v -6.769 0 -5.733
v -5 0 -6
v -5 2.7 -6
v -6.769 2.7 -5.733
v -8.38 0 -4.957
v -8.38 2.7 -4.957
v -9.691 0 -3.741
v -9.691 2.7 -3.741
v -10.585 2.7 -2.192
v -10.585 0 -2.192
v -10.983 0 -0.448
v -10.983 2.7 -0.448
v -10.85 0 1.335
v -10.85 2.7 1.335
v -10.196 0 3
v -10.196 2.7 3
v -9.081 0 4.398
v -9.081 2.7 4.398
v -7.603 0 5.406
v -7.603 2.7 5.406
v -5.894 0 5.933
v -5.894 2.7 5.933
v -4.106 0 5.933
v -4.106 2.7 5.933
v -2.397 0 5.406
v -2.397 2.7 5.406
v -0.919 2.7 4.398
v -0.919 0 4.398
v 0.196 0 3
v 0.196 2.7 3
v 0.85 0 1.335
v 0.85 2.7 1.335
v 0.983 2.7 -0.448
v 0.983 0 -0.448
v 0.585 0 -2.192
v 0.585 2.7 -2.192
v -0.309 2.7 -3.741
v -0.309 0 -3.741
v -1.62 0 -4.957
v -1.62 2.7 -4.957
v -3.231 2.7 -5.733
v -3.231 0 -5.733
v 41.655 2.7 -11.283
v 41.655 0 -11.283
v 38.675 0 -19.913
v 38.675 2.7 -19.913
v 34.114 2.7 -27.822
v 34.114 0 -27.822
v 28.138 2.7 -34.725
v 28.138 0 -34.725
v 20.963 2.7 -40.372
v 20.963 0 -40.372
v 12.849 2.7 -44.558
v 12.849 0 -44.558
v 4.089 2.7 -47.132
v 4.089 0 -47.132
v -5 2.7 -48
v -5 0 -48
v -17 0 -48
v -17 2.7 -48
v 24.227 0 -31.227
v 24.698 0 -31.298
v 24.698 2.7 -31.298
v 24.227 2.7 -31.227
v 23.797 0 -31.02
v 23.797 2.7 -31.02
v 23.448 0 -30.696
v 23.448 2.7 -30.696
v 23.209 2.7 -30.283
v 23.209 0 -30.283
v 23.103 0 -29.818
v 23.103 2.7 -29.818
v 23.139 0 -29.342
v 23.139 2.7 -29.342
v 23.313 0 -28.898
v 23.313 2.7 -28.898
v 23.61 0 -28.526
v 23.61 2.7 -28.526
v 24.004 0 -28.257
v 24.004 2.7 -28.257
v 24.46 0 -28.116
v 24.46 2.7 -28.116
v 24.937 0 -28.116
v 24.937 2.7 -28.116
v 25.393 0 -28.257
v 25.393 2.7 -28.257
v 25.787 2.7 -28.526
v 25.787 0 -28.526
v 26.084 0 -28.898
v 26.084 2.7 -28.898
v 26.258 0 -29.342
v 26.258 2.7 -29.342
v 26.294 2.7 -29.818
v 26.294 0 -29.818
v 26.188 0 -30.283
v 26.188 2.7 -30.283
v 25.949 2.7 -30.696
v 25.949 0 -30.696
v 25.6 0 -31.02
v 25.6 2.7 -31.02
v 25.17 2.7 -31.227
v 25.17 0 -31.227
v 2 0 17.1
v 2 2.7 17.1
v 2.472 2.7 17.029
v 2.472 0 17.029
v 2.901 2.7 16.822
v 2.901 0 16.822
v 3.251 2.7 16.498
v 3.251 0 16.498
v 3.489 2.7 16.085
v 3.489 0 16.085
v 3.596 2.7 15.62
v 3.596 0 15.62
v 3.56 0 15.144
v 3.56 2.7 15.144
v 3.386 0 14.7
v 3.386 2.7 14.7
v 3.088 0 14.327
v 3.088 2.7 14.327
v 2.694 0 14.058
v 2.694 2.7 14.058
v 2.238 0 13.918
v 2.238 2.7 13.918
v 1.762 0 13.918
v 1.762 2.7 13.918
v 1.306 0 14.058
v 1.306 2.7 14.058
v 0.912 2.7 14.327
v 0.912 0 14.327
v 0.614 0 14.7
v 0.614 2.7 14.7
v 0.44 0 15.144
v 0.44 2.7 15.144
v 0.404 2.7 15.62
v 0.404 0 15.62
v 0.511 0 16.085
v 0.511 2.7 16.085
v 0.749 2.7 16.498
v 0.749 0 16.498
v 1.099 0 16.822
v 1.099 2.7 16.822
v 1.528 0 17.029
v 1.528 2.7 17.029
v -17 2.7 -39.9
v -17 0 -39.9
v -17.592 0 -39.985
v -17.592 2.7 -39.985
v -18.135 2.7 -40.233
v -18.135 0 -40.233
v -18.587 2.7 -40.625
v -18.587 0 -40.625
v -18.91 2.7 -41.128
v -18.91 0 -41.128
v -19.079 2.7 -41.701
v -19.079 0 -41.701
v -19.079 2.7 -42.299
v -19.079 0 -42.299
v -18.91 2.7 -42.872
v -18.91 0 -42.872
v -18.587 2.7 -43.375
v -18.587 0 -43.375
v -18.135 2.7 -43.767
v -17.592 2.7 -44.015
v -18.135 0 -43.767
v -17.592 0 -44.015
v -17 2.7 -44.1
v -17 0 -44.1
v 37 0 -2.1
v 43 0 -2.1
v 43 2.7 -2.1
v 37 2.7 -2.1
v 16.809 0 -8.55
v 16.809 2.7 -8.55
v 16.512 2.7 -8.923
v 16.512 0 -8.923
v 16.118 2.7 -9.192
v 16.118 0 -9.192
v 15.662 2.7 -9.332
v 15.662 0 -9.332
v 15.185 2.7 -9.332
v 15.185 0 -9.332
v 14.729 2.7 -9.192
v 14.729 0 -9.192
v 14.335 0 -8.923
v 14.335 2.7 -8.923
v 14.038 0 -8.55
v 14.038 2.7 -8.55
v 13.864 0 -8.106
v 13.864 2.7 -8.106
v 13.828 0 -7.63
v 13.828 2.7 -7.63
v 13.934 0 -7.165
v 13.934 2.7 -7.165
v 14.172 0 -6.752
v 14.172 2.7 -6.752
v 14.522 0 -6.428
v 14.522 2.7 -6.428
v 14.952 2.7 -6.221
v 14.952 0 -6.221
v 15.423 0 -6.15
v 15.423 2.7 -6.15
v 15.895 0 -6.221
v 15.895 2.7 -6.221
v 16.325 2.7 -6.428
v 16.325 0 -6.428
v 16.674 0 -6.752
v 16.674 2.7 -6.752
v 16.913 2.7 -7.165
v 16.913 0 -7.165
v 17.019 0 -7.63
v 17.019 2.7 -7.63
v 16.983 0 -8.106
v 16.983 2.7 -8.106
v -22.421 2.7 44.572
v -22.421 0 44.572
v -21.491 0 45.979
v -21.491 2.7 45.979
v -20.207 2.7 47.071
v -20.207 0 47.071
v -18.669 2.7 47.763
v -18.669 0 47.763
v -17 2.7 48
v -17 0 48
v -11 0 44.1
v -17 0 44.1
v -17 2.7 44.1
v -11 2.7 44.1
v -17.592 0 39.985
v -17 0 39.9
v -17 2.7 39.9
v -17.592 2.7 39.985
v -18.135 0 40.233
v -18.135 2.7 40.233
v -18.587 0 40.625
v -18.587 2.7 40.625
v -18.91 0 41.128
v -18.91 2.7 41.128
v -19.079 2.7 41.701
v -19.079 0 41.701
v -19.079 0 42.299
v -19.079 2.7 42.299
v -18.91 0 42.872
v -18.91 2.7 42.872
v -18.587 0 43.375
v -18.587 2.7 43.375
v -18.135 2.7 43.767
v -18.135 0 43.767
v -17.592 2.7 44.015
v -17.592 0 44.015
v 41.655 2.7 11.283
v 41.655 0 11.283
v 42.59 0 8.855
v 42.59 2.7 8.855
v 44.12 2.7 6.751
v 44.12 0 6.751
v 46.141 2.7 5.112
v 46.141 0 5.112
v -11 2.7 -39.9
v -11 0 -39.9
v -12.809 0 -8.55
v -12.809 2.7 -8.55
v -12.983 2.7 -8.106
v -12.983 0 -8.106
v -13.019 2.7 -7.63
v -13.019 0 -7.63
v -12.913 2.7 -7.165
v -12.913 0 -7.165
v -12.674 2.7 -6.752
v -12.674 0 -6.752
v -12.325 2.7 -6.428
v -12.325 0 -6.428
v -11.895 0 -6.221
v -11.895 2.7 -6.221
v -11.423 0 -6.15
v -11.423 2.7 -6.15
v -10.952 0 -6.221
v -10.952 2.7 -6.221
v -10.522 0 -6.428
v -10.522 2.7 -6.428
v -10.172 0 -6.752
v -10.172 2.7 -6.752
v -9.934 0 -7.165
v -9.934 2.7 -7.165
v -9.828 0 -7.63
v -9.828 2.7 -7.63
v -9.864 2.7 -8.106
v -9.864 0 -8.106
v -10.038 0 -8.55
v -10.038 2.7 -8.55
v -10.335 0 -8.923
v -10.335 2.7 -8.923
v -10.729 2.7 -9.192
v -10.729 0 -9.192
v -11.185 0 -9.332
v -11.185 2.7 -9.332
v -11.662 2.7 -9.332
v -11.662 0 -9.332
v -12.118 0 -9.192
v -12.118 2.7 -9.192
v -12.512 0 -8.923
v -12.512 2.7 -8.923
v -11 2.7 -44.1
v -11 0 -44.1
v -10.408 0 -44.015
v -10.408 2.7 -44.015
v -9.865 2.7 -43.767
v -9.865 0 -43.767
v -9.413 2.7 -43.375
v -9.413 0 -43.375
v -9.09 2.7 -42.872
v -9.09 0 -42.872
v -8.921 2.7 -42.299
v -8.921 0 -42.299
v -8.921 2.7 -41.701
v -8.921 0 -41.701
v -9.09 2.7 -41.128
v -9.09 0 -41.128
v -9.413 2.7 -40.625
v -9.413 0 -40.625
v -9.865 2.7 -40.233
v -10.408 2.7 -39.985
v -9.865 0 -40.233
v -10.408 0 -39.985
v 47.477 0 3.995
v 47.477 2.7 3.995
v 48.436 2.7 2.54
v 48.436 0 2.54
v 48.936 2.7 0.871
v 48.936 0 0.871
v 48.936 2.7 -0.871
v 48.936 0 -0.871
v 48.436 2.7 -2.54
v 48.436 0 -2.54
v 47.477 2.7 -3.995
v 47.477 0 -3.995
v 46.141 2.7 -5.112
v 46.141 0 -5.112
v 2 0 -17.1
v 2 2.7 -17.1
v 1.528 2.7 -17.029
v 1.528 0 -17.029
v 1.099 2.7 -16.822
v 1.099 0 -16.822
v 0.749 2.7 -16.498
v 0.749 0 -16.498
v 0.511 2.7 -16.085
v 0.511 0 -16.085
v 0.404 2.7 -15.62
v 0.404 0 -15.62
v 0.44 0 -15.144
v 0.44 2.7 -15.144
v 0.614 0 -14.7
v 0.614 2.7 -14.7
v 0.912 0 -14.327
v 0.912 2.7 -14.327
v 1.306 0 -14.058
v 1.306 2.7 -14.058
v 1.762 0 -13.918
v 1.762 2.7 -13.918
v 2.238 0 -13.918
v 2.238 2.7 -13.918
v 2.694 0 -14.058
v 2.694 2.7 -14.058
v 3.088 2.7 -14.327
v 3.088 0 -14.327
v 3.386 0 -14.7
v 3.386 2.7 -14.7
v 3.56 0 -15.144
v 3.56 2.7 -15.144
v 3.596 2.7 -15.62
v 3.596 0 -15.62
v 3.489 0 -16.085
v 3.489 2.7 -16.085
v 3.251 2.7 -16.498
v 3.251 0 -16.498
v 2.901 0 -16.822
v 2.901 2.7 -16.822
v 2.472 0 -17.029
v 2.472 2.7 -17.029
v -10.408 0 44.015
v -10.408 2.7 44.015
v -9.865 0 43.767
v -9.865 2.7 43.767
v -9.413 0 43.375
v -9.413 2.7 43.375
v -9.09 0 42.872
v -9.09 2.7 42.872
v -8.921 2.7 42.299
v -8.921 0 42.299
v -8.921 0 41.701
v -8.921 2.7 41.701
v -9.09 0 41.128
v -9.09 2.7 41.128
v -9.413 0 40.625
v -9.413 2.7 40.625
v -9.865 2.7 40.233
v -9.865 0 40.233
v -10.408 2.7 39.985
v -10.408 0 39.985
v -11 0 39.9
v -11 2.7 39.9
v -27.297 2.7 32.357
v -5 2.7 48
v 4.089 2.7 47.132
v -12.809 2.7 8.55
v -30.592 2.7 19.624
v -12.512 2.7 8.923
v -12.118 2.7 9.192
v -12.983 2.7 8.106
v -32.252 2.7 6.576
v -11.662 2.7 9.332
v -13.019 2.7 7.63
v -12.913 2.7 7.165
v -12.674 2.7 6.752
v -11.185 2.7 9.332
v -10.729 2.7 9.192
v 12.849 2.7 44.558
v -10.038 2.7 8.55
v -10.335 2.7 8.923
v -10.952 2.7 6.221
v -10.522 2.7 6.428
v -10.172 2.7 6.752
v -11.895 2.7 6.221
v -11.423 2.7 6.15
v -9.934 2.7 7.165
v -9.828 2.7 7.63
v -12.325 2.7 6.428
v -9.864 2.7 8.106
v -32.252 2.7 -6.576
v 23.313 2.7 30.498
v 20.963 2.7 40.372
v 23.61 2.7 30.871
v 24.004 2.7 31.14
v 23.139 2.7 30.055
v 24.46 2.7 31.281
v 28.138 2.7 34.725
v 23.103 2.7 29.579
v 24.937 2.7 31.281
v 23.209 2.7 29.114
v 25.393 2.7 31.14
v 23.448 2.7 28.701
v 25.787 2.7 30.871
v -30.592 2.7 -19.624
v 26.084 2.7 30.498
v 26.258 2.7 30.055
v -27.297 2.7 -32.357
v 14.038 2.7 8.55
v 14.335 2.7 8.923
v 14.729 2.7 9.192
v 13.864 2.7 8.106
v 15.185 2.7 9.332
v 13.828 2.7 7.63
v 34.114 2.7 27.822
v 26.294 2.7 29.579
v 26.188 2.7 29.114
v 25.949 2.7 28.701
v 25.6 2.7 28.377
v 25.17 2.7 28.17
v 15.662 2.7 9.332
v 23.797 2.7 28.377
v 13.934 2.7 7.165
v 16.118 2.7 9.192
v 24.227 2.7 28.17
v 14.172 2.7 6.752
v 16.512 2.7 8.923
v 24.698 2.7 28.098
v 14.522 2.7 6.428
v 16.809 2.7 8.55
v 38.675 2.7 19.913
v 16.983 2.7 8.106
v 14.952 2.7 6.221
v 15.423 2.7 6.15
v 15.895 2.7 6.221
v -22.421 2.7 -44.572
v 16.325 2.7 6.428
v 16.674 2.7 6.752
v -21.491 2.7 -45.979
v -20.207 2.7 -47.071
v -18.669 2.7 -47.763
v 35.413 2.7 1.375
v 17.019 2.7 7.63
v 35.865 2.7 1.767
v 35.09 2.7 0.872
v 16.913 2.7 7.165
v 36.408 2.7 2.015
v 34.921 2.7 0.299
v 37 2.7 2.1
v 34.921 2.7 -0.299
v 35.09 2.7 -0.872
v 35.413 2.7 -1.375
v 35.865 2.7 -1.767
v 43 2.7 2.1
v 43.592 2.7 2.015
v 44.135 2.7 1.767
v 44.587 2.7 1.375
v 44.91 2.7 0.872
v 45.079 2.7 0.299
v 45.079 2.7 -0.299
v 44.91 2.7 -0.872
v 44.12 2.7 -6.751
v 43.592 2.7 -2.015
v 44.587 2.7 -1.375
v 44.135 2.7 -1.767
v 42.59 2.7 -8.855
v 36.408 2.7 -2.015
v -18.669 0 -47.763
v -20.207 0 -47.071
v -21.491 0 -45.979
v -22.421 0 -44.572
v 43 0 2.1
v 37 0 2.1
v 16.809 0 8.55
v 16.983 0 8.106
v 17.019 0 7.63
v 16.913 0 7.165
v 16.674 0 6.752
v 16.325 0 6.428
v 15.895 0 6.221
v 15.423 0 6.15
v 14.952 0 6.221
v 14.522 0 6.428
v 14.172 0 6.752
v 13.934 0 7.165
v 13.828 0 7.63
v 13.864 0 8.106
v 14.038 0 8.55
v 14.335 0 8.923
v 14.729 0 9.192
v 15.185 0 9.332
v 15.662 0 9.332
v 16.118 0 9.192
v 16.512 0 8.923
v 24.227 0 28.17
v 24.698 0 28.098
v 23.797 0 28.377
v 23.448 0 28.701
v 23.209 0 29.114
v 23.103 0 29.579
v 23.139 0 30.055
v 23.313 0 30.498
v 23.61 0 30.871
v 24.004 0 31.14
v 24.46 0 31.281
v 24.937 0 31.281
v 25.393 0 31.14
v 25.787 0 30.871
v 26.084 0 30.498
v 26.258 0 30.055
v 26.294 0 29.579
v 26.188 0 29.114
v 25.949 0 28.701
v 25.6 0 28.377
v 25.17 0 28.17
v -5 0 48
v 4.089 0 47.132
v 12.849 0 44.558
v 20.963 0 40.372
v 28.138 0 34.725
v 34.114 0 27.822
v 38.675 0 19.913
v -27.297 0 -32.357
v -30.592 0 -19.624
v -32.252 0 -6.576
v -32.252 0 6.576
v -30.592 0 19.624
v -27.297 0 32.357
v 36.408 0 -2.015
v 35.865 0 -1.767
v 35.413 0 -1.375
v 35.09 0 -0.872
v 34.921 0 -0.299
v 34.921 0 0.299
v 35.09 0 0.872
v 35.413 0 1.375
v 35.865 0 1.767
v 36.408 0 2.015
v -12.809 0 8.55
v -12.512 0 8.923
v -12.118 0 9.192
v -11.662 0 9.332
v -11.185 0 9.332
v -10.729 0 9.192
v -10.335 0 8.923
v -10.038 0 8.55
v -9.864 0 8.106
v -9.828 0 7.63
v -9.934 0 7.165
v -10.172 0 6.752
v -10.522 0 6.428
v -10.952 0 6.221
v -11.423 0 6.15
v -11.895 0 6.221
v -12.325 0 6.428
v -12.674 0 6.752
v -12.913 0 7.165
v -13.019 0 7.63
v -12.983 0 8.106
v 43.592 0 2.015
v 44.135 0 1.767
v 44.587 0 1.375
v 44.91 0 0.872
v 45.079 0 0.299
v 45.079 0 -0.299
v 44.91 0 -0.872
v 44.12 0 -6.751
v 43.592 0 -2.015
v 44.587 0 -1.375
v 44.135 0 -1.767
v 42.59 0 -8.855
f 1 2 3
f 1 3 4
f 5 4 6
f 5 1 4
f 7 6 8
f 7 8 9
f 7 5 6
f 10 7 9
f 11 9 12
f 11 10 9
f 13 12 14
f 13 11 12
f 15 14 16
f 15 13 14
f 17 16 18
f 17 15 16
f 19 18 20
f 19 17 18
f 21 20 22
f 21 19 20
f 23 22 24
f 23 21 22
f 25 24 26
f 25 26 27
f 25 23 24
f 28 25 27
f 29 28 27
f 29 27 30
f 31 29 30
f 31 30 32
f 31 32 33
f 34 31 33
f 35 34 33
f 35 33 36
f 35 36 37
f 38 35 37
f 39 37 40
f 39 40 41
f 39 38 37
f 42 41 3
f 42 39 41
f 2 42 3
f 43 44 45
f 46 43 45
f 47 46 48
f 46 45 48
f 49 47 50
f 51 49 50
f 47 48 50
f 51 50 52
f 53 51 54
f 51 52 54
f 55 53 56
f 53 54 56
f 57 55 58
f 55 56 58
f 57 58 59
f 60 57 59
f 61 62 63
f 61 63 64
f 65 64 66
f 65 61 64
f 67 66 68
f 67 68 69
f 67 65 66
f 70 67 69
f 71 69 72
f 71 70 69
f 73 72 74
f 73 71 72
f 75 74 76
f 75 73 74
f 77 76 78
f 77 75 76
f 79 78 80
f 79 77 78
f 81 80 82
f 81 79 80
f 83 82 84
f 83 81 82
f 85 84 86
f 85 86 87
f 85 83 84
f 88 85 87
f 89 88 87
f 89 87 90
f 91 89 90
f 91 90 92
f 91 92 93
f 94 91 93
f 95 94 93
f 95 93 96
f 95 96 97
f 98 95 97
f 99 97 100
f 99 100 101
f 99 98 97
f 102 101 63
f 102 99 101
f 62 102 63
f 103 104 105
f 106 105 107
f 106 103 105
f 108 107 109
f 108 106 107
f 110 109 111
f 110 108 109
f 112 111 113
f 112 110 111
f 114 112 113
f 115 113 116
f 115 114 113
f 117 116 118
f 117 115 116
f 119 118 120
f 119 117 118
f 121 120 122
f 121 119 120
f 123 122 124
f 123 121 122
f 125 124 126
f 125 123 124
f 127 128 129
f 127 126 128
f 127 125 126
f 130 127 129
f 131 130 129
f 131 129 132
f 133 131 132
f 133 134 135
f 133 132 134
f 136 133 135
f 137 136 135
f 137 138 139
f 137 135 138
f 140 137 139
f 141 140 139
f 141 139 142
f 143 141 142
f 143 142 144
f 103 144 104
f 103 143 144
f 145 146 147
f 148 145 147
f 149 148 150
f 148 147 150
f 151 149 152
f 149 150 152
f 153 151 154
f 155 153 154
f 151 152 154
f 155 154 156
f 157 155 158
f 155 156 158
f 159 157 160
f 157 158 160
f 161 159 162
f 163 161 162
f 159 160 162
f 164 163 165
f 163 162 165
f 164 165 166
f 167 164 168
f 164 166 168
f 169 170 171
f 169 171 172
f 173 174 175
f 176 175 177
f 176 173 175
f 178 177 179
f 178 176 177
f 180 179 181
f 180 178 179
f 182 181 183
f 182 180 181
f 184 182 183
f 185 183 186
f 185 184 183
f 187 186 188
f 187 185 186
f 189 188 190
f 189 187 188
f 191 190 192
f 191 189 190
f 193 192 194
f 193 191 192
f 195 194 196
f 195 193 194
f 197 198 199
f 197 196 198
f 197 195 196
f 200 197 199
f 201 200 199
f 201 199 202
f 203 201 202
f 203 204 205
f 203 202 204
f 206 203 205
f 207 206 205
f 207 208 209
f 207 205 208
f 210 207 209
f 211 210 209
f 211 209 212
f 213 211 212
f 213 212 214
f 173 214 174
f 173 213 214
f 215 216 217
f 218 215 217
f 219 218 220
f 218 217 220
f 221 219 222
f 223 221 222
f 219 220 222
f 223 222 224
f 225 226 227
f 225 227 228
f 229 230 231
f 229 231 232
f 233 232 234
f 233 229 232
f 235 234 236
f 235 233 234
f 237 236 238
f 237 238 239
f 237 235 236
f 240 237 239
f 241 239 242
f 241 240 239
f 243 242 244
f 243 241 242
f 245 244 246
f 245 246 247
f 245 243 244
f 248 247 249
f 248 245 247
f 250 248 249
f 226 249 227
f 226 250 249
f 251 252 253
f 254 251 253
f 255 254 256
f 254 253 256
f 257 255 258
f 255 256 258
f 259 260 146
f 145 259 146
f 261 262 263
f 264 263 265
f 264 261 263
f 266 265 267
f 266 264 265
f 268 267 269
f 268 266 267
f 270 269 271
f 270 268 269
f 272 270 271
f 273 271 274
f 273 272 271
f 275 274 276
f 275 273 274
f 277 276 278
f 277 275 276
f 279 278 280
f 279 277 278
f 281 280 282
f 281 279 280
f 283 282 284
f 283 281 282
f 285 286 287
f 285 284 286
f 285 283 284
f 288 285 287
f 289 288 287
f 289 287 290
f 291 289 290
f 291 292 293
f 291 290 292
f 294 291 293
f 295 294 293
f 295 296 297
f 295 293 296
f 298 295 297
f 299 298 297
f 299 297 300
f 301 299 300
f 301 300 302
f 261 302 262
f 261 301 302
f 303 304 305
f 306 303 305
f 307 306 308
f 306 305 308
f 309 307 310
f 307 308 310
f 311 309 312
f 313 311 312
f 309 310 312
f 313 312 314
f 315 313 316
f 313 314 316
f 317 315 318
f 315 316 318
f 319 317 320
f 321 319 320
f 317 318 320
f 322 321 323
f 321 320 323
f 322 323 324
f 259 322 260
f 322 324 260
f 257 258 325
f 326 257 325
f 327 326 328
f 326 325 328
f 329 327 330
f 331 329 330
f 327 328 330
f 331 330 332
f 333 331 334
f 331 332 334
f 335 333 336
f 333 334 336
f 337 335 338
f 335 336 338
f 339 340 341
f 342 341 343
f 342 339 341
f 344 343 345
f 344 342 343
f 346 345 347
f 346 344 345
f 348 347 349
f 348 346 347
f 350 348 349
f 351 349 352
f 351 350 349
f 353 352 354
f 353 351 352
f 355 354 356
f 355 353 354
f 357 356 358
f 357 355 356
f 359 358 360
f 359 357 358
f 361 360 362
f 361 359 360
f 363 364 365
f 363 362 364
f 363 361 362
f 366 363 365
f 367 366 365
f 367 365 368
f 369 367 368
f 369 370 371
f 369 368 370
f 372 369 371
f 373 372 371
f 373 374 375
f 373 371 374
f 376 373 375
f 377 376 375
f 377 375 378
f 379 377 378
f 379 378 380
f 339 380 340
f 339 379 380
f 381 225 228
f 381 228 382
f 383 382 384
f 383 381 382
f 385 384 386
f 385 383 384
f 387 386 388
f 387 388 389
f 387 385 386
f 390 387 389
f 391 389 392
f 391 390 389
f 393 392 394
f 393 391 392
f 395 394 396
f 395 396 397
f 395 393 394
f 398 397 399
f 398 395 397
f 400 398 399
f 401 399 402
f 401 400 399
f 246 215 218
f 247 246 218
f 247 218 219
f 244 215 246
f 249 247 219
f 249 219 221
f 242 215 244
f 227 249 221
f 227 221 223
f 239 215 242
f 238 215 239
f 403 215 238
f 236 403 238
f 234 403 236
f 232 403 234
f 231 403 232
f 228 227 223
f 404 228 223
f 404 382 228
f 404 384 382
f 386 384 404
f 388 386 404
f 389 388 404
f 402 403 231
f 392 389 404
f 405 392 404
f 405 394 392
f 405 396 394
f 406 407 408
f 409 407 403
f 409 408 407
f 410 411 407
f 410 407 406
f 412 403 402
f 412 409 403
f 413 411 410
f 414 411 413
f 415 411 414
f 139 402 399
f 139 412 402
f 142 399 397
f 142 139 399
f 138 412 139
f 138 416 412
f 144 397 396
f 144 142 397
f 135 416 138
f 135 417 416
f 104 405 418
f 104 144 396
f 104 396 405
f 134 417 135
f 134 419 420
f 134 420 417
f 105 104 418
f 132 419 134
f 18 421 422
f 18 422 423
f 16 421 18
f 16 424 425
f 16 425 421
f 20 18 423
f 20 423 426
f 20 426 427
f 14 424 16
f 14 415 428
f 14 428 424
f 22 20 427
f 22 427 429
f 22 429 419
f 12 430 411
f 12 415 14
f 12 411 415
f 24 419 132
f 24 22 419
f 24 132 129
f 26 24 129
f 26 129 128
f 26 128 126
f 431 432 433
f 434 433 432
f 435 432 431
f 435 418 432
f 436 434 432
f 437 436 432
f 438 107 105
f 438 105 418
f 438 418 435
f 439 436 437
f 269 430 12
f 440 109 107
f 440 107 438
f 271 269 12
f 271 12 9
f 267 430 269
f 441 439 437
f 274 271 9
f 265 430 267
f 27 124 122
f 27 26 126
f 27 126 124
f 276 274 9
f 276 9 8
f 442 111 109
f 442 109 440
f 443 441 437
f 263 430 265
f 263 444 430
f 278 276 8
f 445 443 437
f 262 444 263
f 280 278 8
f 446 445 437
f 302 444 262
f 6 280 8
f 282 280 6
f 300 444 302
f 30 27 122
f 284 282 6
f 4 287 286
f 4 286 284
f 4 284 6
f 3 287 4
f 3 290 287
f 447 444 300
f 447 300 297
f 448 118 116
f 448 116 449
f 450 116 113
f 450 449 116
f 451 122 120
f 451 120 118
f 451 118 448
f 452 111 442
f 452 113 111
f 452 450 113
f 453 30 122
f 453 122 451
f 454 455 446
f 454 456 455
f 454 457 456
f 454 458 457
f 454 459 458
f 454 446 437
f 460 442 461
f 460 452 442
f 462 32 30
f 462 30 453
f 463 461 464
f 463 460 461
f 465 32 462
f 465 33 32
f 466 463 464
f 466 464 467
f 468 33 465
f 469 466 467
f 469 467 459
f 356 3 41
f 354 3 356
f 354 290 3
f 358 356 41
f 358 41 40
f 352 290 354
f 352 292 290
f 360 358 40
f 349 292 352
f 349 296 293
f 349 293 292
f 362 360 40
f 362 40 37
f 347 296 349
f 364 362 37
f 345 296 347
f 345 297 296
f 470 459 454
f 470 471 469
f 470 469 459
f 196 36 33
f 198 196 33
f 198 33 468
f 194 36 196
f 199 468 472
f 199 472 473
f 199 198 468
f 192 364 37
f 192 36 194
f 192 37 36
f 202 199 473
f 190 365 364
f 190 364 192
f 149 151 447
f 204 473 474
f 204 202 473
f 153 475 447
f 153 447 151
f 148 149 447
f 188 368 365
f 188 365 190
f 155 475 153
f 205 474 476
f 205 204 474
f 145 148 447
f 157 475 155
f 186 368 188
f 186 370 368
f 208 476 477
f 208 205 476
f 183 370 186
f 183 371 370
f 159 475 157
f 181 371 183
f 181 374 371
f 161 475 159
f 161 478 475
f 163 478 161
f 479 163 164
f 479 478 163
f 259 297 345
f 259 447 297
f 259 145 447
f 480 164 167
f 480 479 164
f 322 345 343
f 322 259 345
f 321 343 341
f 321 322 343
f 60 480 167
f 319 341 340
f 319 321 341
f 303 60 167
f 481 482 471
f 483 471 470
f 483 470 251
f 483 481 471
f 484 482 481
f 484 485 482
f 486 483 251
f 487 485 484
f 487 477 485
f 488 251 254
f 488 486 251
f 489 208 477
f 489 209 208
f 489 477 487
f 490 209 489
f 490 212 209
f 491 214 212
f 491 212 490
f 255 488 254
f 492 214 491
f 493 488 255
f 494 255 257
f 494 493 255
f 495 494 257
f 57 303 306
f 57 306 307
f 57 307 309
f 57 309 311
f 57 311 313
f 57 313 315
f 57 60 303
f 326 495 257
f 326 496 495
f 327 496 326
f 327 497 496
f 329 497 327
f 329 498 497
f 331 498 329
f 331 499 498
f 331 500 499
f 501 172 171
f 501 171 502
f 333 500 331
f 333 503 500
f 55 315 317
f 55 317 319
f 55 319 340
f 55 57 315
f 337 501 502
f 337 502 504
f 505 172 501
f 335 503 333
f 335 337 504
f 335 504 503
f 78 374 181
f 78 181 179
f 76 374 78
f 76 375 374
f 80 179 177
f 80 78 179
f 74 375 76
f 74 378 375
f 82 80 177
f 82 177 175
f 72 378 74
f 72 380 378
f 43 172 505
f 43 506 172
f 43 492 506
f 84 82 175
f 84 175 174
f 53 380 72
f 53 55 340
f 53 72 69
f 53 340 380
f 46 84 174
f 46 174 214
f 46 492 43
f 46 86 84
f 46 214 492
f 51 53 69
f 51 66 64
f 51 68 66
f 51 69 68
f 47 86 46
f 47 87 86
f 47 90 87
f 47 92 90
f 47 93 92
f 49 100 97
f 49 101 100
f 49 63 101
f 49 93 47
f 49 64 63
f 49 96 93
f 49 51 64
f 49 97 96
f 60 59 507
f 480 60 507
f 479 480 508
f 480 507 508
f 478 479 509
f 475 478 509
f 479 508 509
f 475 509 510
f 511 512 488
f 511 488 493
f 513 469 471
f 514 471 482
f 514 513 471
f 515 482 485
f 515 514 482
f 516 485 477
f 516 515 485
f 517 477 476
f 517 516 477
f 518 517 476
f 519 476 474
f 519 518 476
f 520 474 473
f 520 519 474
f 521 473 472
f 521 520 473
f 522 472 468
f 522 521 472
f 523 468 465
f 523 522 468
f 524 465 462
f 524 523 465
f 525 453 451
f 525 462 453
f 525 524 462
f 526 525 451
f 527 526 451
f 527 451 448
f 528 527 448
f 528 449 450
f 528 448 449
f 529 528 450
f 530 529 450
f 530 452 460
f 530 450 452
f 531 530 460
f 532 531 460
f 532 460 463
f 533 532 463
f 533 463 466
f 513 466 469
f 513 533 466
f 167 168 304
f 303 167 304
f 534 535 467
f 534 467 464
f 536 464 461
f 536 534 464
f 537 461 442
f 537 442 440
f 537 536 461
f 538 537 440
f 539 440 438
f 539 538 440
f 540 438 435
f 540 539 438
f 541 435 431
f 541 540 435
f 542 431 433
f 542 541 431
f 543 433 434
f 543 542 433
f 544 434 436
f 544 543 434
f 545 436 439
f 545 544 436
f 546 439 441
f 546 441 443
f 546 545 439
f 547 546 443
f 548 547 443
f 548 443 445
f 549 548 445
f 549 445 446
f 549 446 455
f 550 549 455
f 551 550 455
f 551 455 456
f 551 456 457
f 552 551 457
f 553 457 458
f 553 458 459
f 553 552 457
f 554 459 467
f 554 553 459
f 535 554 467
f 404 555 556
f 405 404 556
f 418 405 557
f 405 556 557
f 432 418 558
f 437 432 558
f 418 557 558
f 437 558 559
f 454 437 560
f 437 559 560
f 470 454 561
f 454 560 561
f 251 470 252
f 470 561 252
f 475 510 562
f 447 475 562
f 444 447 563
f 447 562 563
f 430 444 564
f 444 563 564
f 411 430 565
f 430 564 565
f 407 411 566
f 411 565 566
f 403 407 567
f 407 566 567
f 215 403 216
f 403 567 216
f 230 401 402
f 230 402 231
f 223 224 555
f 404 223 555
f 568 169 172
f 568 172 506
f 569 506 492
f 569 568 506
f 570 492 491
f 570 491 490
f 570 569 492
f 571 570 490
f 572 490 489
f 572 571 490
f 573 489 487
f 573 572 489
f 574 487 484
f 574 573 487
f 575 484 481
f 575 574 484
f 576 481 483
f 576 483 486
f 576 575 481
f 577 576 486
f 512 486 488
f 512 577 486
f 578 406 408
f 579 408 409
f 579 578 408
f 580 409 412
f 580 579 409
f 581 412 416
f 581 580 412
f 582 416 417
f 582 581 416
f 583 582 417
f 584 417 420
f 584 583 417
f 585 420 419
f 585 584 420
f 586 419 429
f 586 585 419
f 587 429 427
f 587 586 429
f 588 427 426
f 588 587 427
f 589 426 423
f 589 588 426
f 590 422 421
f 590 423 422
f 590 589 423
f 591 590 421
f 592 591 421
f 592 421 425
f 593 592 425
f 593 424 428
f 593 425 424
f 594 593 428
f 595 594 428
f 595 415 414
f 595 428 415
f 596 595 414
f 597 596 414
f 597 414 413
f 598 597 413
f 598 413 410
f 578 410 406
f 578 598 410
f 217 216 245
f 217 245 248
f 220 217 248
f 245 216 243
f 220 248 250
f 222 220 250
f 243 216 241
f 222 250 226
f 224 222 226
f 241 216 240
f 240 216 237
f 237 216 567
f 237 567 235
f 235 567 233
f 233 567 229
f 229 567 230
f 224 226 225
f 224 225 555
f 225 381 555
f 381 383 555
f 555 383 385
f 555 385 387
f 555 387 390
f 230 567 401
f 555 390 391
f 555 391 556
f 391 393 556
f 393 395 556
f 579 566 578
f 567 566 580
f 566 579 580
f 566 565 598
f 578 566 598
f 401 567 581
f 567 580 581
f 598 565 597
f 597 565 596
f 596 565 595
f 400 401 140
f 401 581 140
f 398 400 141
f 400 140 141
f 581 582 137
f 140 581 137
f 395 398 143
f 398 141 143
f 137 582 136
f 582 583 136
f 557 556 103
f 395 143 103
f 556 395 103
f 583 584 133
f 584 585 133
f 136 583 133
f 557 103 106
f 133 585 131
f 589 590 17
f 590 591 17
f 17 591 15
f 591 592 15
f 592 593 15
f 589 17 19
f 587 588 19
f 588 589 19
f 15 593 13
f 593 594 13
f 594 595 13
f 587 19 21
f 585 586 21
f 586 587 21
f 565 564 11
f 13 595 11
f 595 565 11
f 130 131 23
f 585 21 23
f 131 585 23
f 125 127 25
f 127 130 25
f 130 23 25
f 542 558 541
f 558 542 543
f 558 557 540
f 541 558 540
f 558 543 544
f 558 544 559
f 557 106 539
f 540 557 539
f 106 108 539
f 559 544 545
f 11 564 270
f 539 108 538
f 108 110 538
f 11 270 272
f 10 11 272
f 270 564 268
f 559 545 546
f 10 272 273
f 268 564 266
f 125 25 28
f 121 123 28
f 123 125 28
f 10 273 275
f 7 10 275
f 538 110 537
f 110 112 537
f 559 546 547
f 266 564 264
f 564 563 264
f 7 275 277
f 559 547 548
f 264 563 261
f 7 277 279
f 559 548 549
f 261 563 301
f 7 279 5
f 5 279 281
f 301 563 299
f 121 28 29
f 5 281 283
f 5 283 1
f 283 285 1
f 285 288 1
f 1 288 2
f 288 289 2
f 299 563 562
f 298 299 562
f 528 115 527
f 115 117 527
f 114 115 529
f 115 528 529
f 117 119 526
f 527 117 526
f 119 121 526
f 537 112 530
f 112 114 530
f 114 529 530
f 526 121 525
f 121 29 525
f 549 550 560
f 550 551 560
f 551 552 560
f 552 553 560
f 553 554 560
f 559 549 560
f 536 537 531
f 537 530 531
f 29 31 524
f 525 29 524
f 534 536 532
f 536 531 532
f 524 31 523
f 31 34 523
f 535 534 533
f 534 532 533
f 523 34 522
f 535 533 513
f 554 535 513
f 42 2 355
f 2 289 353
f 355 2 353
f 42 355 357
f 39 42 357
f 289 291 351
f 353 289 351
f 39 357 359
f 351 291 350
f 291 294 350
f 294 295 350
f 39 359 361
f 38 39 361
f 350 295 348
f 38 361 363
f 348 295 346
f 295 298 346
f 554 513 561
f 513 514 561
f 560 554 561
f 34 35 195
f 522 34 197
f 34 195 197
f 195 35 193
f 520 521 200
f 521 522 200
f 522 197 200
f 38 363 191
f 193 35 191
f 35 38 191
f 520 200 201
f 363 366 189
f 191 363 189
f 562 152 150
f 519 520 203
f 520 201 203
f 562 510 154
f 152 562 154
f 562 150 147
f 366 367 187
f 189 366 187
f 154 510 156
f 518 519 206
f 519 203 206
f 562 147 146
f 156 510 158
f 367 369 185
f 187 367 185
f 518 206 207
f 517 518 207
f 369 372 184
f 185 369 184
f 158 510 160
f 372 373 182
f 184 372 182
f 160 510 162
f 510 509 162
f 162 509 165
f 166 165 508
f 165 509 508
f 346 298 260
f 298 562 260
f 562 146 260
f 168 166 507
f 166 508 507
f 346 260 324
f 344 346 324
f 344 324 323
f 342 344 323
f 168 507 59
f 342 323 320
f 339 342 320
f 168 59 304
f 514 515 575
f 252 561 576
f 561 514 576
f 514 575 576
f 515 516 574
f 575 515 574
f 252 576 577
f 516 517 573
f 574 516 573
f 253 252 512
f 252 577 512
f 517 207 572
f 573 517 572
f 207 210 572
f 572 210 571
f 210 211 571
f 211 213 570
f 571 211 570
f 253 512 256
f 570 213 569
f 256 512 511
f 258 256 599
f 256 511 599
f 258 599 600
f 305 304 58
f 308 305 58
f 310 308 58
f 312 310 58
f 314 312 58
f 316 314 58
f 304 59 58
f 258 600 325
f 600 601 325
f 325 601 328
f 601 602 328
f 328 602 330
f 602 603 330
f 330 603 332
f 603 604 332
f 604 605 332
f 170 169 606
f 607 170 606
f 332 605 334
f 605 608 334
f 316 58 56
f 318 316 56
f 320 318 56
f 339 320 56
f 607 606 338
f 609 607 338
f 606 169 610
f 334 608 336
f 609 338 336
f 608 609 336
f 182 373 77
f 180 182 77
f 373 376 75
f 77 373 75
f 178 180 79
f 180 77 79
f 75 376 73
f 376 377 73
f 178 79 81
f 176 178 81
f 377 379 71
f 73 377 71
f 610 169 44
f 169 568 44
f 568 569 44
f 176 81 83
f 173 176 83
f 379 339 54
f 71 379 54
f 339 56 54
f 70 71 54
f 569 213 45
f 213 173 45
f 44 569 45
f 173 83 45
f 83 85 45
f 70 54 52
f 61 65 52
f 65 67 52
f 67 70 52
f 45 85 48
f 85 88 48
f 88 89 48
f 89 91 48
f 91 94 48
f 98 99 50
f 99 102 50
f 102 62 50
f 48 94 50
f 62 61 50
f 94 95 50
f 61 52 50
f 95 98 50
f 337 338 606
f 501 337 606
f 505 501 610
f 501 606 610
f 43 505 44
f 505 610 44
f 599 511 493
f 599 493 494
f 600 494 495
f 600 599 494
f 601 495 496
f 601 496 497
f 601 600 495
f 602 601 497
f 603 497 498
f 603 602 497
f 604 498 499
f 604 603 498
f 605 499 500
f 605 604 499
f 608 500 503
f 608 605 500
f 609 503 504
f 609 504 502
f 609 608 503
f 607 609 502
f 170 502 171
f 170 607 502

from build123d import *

# Parameters (mm, degrees)
ESQUISSE2_R                  = 6
ESQUISSE2_R_2                = 1.6
BOSS_EXTRU_1_DEPTH           = 2.7
ESQUISSE3_R                  = 1.6
ENL_V_MAT_EXTRU_1_DEPTH      = 69.646121522
R_P_TITION_CIRCULAIRE1_COUNT = 6


with BuildPart() as part:
    # Esquisse2 → Boss.-Extru.1 (new body)
    with BuildSketch(Plane(origin=(0, 0, 0), x_dir=(1, 0, 0), z_dir=(0, 1, 0))):
        with BuildLine():
            Line((-17, -48), (-5, -48))
            ThreePointArc((-5, -48), (24.685348475, -37.719757236), (41.655172414, -11.28250358))
            ThreePointArc((41.655172414, -11.28250358), (43.286450296, -7.752943214), (46.140625, -5.112384435))
            ThreePointArc((46.140625, -5.112384435), (49, 0), (46.140625, 5.112384435))
            ThreePointArc((46.140625, 5.112384435), (43.286450296, 7.752943214), (41.655172414, 11.28250358))
            ThreePointArc((41.655172414, 11.28250358), (24.685348475, 37.719757236), (-5, 48))
            Line((-5, 48), (-17, 48))
            ThreePointArc((-17, 48), (-20.20664932, 47.071232606), (-22.420554861, 44.572466714))
            ThreePointArc((-22.420554861, 44.572466714), (-32.460451204, 0), (-22.420554861, -44.572466714))
            ThreePointArc((-22.420554861, -44.572466714), (-20.20664932, -47.071232606), (-17, -48))
        make_face()
        with Locations((-5, 0)):
            Circle(ESQUISSE2_R, mode=Mode.SUBTRACT)
        with Locations((24.69848481, 29.69848481)):
            Circle(ESQUISSE2_R_2, mode=Mode.SUBTRACT)
        with Locations((24.69848481, -29.69848481)):
            Circle(ESQUISSE2_R_2, mode=Mode.SUBTRACT)
        with BuildLine():
            Line((-17, 44.1), (-11, 44.1))
            ThreePointArc((-11, 44.1), (-8.9, 42), (-11, 39.9))
            Line((-11, 39.9), (-17, 39.9))
            ThreePointArc((-17, 39.9), (-19.1, 42), (-17, 44.1))
        make_face(mode=Mode.SUBTRACT)
        with BuildLine():
            Line((43, 2.1), (37, 2.1))
            ThreePointArc((37, 2.1), (34.9, 0), (37, -2.1))
            Line((37, -2.1), (43, -2.1))
            ThreePointArc((43, -2.1), (45.1, 0), (43, 2.1))
        make_face(mode=Mode.SUBTRACT)
        with BuildLine():
            Line((-17, -44.1), (-11, -44.1))
            ThreePointArc((-11, -44.1), (-8.9, -42), (-11, -39.9))
            Line((-11, -39.9), (-17, -39.9))
            ThreePointArc((-17, -39.9), (-19.1, -42), (-17, -44.1))
        make_face(mode=Mode.SUBTRACT)
    extrude(amount=BOSS_EXTRU_1_DEPTH)

    # Esquisse3 → Enlèv. mat.-Extru.1 (cut, through all)
    with BuildSketch(Plane(origin=(0, 0, 0), x_dir=(1, 0, 0), z_dir=(0, 1, 0))):
        with Locations((2, 15.5)):
            Circle(ESQUISSE3_R)
    enl_v_mat_extru_1 = extrude(amount=ENL_V_MAT_EXTRU_1_DEPTH, mode=Mode.SUBTRACT)

    # Répétition circulaire1: Enlèv. mat.-Extru.1 ×6 about axis
    r_p_tition_circulaire1_axis = Axis((2, 0, 0), (0, 1, 0))
    for i in range(1, R_P_TITION_CIRCULAIRE1_COUNT):
        add(enl_v_mat_extru_1.rotate(r_p_tition_circulaire1_axis, i * 360 / R_P_TITION_CIRCULAIRE1_COUNT), mode=Mode.SUBTRACT)


solid = part.part
